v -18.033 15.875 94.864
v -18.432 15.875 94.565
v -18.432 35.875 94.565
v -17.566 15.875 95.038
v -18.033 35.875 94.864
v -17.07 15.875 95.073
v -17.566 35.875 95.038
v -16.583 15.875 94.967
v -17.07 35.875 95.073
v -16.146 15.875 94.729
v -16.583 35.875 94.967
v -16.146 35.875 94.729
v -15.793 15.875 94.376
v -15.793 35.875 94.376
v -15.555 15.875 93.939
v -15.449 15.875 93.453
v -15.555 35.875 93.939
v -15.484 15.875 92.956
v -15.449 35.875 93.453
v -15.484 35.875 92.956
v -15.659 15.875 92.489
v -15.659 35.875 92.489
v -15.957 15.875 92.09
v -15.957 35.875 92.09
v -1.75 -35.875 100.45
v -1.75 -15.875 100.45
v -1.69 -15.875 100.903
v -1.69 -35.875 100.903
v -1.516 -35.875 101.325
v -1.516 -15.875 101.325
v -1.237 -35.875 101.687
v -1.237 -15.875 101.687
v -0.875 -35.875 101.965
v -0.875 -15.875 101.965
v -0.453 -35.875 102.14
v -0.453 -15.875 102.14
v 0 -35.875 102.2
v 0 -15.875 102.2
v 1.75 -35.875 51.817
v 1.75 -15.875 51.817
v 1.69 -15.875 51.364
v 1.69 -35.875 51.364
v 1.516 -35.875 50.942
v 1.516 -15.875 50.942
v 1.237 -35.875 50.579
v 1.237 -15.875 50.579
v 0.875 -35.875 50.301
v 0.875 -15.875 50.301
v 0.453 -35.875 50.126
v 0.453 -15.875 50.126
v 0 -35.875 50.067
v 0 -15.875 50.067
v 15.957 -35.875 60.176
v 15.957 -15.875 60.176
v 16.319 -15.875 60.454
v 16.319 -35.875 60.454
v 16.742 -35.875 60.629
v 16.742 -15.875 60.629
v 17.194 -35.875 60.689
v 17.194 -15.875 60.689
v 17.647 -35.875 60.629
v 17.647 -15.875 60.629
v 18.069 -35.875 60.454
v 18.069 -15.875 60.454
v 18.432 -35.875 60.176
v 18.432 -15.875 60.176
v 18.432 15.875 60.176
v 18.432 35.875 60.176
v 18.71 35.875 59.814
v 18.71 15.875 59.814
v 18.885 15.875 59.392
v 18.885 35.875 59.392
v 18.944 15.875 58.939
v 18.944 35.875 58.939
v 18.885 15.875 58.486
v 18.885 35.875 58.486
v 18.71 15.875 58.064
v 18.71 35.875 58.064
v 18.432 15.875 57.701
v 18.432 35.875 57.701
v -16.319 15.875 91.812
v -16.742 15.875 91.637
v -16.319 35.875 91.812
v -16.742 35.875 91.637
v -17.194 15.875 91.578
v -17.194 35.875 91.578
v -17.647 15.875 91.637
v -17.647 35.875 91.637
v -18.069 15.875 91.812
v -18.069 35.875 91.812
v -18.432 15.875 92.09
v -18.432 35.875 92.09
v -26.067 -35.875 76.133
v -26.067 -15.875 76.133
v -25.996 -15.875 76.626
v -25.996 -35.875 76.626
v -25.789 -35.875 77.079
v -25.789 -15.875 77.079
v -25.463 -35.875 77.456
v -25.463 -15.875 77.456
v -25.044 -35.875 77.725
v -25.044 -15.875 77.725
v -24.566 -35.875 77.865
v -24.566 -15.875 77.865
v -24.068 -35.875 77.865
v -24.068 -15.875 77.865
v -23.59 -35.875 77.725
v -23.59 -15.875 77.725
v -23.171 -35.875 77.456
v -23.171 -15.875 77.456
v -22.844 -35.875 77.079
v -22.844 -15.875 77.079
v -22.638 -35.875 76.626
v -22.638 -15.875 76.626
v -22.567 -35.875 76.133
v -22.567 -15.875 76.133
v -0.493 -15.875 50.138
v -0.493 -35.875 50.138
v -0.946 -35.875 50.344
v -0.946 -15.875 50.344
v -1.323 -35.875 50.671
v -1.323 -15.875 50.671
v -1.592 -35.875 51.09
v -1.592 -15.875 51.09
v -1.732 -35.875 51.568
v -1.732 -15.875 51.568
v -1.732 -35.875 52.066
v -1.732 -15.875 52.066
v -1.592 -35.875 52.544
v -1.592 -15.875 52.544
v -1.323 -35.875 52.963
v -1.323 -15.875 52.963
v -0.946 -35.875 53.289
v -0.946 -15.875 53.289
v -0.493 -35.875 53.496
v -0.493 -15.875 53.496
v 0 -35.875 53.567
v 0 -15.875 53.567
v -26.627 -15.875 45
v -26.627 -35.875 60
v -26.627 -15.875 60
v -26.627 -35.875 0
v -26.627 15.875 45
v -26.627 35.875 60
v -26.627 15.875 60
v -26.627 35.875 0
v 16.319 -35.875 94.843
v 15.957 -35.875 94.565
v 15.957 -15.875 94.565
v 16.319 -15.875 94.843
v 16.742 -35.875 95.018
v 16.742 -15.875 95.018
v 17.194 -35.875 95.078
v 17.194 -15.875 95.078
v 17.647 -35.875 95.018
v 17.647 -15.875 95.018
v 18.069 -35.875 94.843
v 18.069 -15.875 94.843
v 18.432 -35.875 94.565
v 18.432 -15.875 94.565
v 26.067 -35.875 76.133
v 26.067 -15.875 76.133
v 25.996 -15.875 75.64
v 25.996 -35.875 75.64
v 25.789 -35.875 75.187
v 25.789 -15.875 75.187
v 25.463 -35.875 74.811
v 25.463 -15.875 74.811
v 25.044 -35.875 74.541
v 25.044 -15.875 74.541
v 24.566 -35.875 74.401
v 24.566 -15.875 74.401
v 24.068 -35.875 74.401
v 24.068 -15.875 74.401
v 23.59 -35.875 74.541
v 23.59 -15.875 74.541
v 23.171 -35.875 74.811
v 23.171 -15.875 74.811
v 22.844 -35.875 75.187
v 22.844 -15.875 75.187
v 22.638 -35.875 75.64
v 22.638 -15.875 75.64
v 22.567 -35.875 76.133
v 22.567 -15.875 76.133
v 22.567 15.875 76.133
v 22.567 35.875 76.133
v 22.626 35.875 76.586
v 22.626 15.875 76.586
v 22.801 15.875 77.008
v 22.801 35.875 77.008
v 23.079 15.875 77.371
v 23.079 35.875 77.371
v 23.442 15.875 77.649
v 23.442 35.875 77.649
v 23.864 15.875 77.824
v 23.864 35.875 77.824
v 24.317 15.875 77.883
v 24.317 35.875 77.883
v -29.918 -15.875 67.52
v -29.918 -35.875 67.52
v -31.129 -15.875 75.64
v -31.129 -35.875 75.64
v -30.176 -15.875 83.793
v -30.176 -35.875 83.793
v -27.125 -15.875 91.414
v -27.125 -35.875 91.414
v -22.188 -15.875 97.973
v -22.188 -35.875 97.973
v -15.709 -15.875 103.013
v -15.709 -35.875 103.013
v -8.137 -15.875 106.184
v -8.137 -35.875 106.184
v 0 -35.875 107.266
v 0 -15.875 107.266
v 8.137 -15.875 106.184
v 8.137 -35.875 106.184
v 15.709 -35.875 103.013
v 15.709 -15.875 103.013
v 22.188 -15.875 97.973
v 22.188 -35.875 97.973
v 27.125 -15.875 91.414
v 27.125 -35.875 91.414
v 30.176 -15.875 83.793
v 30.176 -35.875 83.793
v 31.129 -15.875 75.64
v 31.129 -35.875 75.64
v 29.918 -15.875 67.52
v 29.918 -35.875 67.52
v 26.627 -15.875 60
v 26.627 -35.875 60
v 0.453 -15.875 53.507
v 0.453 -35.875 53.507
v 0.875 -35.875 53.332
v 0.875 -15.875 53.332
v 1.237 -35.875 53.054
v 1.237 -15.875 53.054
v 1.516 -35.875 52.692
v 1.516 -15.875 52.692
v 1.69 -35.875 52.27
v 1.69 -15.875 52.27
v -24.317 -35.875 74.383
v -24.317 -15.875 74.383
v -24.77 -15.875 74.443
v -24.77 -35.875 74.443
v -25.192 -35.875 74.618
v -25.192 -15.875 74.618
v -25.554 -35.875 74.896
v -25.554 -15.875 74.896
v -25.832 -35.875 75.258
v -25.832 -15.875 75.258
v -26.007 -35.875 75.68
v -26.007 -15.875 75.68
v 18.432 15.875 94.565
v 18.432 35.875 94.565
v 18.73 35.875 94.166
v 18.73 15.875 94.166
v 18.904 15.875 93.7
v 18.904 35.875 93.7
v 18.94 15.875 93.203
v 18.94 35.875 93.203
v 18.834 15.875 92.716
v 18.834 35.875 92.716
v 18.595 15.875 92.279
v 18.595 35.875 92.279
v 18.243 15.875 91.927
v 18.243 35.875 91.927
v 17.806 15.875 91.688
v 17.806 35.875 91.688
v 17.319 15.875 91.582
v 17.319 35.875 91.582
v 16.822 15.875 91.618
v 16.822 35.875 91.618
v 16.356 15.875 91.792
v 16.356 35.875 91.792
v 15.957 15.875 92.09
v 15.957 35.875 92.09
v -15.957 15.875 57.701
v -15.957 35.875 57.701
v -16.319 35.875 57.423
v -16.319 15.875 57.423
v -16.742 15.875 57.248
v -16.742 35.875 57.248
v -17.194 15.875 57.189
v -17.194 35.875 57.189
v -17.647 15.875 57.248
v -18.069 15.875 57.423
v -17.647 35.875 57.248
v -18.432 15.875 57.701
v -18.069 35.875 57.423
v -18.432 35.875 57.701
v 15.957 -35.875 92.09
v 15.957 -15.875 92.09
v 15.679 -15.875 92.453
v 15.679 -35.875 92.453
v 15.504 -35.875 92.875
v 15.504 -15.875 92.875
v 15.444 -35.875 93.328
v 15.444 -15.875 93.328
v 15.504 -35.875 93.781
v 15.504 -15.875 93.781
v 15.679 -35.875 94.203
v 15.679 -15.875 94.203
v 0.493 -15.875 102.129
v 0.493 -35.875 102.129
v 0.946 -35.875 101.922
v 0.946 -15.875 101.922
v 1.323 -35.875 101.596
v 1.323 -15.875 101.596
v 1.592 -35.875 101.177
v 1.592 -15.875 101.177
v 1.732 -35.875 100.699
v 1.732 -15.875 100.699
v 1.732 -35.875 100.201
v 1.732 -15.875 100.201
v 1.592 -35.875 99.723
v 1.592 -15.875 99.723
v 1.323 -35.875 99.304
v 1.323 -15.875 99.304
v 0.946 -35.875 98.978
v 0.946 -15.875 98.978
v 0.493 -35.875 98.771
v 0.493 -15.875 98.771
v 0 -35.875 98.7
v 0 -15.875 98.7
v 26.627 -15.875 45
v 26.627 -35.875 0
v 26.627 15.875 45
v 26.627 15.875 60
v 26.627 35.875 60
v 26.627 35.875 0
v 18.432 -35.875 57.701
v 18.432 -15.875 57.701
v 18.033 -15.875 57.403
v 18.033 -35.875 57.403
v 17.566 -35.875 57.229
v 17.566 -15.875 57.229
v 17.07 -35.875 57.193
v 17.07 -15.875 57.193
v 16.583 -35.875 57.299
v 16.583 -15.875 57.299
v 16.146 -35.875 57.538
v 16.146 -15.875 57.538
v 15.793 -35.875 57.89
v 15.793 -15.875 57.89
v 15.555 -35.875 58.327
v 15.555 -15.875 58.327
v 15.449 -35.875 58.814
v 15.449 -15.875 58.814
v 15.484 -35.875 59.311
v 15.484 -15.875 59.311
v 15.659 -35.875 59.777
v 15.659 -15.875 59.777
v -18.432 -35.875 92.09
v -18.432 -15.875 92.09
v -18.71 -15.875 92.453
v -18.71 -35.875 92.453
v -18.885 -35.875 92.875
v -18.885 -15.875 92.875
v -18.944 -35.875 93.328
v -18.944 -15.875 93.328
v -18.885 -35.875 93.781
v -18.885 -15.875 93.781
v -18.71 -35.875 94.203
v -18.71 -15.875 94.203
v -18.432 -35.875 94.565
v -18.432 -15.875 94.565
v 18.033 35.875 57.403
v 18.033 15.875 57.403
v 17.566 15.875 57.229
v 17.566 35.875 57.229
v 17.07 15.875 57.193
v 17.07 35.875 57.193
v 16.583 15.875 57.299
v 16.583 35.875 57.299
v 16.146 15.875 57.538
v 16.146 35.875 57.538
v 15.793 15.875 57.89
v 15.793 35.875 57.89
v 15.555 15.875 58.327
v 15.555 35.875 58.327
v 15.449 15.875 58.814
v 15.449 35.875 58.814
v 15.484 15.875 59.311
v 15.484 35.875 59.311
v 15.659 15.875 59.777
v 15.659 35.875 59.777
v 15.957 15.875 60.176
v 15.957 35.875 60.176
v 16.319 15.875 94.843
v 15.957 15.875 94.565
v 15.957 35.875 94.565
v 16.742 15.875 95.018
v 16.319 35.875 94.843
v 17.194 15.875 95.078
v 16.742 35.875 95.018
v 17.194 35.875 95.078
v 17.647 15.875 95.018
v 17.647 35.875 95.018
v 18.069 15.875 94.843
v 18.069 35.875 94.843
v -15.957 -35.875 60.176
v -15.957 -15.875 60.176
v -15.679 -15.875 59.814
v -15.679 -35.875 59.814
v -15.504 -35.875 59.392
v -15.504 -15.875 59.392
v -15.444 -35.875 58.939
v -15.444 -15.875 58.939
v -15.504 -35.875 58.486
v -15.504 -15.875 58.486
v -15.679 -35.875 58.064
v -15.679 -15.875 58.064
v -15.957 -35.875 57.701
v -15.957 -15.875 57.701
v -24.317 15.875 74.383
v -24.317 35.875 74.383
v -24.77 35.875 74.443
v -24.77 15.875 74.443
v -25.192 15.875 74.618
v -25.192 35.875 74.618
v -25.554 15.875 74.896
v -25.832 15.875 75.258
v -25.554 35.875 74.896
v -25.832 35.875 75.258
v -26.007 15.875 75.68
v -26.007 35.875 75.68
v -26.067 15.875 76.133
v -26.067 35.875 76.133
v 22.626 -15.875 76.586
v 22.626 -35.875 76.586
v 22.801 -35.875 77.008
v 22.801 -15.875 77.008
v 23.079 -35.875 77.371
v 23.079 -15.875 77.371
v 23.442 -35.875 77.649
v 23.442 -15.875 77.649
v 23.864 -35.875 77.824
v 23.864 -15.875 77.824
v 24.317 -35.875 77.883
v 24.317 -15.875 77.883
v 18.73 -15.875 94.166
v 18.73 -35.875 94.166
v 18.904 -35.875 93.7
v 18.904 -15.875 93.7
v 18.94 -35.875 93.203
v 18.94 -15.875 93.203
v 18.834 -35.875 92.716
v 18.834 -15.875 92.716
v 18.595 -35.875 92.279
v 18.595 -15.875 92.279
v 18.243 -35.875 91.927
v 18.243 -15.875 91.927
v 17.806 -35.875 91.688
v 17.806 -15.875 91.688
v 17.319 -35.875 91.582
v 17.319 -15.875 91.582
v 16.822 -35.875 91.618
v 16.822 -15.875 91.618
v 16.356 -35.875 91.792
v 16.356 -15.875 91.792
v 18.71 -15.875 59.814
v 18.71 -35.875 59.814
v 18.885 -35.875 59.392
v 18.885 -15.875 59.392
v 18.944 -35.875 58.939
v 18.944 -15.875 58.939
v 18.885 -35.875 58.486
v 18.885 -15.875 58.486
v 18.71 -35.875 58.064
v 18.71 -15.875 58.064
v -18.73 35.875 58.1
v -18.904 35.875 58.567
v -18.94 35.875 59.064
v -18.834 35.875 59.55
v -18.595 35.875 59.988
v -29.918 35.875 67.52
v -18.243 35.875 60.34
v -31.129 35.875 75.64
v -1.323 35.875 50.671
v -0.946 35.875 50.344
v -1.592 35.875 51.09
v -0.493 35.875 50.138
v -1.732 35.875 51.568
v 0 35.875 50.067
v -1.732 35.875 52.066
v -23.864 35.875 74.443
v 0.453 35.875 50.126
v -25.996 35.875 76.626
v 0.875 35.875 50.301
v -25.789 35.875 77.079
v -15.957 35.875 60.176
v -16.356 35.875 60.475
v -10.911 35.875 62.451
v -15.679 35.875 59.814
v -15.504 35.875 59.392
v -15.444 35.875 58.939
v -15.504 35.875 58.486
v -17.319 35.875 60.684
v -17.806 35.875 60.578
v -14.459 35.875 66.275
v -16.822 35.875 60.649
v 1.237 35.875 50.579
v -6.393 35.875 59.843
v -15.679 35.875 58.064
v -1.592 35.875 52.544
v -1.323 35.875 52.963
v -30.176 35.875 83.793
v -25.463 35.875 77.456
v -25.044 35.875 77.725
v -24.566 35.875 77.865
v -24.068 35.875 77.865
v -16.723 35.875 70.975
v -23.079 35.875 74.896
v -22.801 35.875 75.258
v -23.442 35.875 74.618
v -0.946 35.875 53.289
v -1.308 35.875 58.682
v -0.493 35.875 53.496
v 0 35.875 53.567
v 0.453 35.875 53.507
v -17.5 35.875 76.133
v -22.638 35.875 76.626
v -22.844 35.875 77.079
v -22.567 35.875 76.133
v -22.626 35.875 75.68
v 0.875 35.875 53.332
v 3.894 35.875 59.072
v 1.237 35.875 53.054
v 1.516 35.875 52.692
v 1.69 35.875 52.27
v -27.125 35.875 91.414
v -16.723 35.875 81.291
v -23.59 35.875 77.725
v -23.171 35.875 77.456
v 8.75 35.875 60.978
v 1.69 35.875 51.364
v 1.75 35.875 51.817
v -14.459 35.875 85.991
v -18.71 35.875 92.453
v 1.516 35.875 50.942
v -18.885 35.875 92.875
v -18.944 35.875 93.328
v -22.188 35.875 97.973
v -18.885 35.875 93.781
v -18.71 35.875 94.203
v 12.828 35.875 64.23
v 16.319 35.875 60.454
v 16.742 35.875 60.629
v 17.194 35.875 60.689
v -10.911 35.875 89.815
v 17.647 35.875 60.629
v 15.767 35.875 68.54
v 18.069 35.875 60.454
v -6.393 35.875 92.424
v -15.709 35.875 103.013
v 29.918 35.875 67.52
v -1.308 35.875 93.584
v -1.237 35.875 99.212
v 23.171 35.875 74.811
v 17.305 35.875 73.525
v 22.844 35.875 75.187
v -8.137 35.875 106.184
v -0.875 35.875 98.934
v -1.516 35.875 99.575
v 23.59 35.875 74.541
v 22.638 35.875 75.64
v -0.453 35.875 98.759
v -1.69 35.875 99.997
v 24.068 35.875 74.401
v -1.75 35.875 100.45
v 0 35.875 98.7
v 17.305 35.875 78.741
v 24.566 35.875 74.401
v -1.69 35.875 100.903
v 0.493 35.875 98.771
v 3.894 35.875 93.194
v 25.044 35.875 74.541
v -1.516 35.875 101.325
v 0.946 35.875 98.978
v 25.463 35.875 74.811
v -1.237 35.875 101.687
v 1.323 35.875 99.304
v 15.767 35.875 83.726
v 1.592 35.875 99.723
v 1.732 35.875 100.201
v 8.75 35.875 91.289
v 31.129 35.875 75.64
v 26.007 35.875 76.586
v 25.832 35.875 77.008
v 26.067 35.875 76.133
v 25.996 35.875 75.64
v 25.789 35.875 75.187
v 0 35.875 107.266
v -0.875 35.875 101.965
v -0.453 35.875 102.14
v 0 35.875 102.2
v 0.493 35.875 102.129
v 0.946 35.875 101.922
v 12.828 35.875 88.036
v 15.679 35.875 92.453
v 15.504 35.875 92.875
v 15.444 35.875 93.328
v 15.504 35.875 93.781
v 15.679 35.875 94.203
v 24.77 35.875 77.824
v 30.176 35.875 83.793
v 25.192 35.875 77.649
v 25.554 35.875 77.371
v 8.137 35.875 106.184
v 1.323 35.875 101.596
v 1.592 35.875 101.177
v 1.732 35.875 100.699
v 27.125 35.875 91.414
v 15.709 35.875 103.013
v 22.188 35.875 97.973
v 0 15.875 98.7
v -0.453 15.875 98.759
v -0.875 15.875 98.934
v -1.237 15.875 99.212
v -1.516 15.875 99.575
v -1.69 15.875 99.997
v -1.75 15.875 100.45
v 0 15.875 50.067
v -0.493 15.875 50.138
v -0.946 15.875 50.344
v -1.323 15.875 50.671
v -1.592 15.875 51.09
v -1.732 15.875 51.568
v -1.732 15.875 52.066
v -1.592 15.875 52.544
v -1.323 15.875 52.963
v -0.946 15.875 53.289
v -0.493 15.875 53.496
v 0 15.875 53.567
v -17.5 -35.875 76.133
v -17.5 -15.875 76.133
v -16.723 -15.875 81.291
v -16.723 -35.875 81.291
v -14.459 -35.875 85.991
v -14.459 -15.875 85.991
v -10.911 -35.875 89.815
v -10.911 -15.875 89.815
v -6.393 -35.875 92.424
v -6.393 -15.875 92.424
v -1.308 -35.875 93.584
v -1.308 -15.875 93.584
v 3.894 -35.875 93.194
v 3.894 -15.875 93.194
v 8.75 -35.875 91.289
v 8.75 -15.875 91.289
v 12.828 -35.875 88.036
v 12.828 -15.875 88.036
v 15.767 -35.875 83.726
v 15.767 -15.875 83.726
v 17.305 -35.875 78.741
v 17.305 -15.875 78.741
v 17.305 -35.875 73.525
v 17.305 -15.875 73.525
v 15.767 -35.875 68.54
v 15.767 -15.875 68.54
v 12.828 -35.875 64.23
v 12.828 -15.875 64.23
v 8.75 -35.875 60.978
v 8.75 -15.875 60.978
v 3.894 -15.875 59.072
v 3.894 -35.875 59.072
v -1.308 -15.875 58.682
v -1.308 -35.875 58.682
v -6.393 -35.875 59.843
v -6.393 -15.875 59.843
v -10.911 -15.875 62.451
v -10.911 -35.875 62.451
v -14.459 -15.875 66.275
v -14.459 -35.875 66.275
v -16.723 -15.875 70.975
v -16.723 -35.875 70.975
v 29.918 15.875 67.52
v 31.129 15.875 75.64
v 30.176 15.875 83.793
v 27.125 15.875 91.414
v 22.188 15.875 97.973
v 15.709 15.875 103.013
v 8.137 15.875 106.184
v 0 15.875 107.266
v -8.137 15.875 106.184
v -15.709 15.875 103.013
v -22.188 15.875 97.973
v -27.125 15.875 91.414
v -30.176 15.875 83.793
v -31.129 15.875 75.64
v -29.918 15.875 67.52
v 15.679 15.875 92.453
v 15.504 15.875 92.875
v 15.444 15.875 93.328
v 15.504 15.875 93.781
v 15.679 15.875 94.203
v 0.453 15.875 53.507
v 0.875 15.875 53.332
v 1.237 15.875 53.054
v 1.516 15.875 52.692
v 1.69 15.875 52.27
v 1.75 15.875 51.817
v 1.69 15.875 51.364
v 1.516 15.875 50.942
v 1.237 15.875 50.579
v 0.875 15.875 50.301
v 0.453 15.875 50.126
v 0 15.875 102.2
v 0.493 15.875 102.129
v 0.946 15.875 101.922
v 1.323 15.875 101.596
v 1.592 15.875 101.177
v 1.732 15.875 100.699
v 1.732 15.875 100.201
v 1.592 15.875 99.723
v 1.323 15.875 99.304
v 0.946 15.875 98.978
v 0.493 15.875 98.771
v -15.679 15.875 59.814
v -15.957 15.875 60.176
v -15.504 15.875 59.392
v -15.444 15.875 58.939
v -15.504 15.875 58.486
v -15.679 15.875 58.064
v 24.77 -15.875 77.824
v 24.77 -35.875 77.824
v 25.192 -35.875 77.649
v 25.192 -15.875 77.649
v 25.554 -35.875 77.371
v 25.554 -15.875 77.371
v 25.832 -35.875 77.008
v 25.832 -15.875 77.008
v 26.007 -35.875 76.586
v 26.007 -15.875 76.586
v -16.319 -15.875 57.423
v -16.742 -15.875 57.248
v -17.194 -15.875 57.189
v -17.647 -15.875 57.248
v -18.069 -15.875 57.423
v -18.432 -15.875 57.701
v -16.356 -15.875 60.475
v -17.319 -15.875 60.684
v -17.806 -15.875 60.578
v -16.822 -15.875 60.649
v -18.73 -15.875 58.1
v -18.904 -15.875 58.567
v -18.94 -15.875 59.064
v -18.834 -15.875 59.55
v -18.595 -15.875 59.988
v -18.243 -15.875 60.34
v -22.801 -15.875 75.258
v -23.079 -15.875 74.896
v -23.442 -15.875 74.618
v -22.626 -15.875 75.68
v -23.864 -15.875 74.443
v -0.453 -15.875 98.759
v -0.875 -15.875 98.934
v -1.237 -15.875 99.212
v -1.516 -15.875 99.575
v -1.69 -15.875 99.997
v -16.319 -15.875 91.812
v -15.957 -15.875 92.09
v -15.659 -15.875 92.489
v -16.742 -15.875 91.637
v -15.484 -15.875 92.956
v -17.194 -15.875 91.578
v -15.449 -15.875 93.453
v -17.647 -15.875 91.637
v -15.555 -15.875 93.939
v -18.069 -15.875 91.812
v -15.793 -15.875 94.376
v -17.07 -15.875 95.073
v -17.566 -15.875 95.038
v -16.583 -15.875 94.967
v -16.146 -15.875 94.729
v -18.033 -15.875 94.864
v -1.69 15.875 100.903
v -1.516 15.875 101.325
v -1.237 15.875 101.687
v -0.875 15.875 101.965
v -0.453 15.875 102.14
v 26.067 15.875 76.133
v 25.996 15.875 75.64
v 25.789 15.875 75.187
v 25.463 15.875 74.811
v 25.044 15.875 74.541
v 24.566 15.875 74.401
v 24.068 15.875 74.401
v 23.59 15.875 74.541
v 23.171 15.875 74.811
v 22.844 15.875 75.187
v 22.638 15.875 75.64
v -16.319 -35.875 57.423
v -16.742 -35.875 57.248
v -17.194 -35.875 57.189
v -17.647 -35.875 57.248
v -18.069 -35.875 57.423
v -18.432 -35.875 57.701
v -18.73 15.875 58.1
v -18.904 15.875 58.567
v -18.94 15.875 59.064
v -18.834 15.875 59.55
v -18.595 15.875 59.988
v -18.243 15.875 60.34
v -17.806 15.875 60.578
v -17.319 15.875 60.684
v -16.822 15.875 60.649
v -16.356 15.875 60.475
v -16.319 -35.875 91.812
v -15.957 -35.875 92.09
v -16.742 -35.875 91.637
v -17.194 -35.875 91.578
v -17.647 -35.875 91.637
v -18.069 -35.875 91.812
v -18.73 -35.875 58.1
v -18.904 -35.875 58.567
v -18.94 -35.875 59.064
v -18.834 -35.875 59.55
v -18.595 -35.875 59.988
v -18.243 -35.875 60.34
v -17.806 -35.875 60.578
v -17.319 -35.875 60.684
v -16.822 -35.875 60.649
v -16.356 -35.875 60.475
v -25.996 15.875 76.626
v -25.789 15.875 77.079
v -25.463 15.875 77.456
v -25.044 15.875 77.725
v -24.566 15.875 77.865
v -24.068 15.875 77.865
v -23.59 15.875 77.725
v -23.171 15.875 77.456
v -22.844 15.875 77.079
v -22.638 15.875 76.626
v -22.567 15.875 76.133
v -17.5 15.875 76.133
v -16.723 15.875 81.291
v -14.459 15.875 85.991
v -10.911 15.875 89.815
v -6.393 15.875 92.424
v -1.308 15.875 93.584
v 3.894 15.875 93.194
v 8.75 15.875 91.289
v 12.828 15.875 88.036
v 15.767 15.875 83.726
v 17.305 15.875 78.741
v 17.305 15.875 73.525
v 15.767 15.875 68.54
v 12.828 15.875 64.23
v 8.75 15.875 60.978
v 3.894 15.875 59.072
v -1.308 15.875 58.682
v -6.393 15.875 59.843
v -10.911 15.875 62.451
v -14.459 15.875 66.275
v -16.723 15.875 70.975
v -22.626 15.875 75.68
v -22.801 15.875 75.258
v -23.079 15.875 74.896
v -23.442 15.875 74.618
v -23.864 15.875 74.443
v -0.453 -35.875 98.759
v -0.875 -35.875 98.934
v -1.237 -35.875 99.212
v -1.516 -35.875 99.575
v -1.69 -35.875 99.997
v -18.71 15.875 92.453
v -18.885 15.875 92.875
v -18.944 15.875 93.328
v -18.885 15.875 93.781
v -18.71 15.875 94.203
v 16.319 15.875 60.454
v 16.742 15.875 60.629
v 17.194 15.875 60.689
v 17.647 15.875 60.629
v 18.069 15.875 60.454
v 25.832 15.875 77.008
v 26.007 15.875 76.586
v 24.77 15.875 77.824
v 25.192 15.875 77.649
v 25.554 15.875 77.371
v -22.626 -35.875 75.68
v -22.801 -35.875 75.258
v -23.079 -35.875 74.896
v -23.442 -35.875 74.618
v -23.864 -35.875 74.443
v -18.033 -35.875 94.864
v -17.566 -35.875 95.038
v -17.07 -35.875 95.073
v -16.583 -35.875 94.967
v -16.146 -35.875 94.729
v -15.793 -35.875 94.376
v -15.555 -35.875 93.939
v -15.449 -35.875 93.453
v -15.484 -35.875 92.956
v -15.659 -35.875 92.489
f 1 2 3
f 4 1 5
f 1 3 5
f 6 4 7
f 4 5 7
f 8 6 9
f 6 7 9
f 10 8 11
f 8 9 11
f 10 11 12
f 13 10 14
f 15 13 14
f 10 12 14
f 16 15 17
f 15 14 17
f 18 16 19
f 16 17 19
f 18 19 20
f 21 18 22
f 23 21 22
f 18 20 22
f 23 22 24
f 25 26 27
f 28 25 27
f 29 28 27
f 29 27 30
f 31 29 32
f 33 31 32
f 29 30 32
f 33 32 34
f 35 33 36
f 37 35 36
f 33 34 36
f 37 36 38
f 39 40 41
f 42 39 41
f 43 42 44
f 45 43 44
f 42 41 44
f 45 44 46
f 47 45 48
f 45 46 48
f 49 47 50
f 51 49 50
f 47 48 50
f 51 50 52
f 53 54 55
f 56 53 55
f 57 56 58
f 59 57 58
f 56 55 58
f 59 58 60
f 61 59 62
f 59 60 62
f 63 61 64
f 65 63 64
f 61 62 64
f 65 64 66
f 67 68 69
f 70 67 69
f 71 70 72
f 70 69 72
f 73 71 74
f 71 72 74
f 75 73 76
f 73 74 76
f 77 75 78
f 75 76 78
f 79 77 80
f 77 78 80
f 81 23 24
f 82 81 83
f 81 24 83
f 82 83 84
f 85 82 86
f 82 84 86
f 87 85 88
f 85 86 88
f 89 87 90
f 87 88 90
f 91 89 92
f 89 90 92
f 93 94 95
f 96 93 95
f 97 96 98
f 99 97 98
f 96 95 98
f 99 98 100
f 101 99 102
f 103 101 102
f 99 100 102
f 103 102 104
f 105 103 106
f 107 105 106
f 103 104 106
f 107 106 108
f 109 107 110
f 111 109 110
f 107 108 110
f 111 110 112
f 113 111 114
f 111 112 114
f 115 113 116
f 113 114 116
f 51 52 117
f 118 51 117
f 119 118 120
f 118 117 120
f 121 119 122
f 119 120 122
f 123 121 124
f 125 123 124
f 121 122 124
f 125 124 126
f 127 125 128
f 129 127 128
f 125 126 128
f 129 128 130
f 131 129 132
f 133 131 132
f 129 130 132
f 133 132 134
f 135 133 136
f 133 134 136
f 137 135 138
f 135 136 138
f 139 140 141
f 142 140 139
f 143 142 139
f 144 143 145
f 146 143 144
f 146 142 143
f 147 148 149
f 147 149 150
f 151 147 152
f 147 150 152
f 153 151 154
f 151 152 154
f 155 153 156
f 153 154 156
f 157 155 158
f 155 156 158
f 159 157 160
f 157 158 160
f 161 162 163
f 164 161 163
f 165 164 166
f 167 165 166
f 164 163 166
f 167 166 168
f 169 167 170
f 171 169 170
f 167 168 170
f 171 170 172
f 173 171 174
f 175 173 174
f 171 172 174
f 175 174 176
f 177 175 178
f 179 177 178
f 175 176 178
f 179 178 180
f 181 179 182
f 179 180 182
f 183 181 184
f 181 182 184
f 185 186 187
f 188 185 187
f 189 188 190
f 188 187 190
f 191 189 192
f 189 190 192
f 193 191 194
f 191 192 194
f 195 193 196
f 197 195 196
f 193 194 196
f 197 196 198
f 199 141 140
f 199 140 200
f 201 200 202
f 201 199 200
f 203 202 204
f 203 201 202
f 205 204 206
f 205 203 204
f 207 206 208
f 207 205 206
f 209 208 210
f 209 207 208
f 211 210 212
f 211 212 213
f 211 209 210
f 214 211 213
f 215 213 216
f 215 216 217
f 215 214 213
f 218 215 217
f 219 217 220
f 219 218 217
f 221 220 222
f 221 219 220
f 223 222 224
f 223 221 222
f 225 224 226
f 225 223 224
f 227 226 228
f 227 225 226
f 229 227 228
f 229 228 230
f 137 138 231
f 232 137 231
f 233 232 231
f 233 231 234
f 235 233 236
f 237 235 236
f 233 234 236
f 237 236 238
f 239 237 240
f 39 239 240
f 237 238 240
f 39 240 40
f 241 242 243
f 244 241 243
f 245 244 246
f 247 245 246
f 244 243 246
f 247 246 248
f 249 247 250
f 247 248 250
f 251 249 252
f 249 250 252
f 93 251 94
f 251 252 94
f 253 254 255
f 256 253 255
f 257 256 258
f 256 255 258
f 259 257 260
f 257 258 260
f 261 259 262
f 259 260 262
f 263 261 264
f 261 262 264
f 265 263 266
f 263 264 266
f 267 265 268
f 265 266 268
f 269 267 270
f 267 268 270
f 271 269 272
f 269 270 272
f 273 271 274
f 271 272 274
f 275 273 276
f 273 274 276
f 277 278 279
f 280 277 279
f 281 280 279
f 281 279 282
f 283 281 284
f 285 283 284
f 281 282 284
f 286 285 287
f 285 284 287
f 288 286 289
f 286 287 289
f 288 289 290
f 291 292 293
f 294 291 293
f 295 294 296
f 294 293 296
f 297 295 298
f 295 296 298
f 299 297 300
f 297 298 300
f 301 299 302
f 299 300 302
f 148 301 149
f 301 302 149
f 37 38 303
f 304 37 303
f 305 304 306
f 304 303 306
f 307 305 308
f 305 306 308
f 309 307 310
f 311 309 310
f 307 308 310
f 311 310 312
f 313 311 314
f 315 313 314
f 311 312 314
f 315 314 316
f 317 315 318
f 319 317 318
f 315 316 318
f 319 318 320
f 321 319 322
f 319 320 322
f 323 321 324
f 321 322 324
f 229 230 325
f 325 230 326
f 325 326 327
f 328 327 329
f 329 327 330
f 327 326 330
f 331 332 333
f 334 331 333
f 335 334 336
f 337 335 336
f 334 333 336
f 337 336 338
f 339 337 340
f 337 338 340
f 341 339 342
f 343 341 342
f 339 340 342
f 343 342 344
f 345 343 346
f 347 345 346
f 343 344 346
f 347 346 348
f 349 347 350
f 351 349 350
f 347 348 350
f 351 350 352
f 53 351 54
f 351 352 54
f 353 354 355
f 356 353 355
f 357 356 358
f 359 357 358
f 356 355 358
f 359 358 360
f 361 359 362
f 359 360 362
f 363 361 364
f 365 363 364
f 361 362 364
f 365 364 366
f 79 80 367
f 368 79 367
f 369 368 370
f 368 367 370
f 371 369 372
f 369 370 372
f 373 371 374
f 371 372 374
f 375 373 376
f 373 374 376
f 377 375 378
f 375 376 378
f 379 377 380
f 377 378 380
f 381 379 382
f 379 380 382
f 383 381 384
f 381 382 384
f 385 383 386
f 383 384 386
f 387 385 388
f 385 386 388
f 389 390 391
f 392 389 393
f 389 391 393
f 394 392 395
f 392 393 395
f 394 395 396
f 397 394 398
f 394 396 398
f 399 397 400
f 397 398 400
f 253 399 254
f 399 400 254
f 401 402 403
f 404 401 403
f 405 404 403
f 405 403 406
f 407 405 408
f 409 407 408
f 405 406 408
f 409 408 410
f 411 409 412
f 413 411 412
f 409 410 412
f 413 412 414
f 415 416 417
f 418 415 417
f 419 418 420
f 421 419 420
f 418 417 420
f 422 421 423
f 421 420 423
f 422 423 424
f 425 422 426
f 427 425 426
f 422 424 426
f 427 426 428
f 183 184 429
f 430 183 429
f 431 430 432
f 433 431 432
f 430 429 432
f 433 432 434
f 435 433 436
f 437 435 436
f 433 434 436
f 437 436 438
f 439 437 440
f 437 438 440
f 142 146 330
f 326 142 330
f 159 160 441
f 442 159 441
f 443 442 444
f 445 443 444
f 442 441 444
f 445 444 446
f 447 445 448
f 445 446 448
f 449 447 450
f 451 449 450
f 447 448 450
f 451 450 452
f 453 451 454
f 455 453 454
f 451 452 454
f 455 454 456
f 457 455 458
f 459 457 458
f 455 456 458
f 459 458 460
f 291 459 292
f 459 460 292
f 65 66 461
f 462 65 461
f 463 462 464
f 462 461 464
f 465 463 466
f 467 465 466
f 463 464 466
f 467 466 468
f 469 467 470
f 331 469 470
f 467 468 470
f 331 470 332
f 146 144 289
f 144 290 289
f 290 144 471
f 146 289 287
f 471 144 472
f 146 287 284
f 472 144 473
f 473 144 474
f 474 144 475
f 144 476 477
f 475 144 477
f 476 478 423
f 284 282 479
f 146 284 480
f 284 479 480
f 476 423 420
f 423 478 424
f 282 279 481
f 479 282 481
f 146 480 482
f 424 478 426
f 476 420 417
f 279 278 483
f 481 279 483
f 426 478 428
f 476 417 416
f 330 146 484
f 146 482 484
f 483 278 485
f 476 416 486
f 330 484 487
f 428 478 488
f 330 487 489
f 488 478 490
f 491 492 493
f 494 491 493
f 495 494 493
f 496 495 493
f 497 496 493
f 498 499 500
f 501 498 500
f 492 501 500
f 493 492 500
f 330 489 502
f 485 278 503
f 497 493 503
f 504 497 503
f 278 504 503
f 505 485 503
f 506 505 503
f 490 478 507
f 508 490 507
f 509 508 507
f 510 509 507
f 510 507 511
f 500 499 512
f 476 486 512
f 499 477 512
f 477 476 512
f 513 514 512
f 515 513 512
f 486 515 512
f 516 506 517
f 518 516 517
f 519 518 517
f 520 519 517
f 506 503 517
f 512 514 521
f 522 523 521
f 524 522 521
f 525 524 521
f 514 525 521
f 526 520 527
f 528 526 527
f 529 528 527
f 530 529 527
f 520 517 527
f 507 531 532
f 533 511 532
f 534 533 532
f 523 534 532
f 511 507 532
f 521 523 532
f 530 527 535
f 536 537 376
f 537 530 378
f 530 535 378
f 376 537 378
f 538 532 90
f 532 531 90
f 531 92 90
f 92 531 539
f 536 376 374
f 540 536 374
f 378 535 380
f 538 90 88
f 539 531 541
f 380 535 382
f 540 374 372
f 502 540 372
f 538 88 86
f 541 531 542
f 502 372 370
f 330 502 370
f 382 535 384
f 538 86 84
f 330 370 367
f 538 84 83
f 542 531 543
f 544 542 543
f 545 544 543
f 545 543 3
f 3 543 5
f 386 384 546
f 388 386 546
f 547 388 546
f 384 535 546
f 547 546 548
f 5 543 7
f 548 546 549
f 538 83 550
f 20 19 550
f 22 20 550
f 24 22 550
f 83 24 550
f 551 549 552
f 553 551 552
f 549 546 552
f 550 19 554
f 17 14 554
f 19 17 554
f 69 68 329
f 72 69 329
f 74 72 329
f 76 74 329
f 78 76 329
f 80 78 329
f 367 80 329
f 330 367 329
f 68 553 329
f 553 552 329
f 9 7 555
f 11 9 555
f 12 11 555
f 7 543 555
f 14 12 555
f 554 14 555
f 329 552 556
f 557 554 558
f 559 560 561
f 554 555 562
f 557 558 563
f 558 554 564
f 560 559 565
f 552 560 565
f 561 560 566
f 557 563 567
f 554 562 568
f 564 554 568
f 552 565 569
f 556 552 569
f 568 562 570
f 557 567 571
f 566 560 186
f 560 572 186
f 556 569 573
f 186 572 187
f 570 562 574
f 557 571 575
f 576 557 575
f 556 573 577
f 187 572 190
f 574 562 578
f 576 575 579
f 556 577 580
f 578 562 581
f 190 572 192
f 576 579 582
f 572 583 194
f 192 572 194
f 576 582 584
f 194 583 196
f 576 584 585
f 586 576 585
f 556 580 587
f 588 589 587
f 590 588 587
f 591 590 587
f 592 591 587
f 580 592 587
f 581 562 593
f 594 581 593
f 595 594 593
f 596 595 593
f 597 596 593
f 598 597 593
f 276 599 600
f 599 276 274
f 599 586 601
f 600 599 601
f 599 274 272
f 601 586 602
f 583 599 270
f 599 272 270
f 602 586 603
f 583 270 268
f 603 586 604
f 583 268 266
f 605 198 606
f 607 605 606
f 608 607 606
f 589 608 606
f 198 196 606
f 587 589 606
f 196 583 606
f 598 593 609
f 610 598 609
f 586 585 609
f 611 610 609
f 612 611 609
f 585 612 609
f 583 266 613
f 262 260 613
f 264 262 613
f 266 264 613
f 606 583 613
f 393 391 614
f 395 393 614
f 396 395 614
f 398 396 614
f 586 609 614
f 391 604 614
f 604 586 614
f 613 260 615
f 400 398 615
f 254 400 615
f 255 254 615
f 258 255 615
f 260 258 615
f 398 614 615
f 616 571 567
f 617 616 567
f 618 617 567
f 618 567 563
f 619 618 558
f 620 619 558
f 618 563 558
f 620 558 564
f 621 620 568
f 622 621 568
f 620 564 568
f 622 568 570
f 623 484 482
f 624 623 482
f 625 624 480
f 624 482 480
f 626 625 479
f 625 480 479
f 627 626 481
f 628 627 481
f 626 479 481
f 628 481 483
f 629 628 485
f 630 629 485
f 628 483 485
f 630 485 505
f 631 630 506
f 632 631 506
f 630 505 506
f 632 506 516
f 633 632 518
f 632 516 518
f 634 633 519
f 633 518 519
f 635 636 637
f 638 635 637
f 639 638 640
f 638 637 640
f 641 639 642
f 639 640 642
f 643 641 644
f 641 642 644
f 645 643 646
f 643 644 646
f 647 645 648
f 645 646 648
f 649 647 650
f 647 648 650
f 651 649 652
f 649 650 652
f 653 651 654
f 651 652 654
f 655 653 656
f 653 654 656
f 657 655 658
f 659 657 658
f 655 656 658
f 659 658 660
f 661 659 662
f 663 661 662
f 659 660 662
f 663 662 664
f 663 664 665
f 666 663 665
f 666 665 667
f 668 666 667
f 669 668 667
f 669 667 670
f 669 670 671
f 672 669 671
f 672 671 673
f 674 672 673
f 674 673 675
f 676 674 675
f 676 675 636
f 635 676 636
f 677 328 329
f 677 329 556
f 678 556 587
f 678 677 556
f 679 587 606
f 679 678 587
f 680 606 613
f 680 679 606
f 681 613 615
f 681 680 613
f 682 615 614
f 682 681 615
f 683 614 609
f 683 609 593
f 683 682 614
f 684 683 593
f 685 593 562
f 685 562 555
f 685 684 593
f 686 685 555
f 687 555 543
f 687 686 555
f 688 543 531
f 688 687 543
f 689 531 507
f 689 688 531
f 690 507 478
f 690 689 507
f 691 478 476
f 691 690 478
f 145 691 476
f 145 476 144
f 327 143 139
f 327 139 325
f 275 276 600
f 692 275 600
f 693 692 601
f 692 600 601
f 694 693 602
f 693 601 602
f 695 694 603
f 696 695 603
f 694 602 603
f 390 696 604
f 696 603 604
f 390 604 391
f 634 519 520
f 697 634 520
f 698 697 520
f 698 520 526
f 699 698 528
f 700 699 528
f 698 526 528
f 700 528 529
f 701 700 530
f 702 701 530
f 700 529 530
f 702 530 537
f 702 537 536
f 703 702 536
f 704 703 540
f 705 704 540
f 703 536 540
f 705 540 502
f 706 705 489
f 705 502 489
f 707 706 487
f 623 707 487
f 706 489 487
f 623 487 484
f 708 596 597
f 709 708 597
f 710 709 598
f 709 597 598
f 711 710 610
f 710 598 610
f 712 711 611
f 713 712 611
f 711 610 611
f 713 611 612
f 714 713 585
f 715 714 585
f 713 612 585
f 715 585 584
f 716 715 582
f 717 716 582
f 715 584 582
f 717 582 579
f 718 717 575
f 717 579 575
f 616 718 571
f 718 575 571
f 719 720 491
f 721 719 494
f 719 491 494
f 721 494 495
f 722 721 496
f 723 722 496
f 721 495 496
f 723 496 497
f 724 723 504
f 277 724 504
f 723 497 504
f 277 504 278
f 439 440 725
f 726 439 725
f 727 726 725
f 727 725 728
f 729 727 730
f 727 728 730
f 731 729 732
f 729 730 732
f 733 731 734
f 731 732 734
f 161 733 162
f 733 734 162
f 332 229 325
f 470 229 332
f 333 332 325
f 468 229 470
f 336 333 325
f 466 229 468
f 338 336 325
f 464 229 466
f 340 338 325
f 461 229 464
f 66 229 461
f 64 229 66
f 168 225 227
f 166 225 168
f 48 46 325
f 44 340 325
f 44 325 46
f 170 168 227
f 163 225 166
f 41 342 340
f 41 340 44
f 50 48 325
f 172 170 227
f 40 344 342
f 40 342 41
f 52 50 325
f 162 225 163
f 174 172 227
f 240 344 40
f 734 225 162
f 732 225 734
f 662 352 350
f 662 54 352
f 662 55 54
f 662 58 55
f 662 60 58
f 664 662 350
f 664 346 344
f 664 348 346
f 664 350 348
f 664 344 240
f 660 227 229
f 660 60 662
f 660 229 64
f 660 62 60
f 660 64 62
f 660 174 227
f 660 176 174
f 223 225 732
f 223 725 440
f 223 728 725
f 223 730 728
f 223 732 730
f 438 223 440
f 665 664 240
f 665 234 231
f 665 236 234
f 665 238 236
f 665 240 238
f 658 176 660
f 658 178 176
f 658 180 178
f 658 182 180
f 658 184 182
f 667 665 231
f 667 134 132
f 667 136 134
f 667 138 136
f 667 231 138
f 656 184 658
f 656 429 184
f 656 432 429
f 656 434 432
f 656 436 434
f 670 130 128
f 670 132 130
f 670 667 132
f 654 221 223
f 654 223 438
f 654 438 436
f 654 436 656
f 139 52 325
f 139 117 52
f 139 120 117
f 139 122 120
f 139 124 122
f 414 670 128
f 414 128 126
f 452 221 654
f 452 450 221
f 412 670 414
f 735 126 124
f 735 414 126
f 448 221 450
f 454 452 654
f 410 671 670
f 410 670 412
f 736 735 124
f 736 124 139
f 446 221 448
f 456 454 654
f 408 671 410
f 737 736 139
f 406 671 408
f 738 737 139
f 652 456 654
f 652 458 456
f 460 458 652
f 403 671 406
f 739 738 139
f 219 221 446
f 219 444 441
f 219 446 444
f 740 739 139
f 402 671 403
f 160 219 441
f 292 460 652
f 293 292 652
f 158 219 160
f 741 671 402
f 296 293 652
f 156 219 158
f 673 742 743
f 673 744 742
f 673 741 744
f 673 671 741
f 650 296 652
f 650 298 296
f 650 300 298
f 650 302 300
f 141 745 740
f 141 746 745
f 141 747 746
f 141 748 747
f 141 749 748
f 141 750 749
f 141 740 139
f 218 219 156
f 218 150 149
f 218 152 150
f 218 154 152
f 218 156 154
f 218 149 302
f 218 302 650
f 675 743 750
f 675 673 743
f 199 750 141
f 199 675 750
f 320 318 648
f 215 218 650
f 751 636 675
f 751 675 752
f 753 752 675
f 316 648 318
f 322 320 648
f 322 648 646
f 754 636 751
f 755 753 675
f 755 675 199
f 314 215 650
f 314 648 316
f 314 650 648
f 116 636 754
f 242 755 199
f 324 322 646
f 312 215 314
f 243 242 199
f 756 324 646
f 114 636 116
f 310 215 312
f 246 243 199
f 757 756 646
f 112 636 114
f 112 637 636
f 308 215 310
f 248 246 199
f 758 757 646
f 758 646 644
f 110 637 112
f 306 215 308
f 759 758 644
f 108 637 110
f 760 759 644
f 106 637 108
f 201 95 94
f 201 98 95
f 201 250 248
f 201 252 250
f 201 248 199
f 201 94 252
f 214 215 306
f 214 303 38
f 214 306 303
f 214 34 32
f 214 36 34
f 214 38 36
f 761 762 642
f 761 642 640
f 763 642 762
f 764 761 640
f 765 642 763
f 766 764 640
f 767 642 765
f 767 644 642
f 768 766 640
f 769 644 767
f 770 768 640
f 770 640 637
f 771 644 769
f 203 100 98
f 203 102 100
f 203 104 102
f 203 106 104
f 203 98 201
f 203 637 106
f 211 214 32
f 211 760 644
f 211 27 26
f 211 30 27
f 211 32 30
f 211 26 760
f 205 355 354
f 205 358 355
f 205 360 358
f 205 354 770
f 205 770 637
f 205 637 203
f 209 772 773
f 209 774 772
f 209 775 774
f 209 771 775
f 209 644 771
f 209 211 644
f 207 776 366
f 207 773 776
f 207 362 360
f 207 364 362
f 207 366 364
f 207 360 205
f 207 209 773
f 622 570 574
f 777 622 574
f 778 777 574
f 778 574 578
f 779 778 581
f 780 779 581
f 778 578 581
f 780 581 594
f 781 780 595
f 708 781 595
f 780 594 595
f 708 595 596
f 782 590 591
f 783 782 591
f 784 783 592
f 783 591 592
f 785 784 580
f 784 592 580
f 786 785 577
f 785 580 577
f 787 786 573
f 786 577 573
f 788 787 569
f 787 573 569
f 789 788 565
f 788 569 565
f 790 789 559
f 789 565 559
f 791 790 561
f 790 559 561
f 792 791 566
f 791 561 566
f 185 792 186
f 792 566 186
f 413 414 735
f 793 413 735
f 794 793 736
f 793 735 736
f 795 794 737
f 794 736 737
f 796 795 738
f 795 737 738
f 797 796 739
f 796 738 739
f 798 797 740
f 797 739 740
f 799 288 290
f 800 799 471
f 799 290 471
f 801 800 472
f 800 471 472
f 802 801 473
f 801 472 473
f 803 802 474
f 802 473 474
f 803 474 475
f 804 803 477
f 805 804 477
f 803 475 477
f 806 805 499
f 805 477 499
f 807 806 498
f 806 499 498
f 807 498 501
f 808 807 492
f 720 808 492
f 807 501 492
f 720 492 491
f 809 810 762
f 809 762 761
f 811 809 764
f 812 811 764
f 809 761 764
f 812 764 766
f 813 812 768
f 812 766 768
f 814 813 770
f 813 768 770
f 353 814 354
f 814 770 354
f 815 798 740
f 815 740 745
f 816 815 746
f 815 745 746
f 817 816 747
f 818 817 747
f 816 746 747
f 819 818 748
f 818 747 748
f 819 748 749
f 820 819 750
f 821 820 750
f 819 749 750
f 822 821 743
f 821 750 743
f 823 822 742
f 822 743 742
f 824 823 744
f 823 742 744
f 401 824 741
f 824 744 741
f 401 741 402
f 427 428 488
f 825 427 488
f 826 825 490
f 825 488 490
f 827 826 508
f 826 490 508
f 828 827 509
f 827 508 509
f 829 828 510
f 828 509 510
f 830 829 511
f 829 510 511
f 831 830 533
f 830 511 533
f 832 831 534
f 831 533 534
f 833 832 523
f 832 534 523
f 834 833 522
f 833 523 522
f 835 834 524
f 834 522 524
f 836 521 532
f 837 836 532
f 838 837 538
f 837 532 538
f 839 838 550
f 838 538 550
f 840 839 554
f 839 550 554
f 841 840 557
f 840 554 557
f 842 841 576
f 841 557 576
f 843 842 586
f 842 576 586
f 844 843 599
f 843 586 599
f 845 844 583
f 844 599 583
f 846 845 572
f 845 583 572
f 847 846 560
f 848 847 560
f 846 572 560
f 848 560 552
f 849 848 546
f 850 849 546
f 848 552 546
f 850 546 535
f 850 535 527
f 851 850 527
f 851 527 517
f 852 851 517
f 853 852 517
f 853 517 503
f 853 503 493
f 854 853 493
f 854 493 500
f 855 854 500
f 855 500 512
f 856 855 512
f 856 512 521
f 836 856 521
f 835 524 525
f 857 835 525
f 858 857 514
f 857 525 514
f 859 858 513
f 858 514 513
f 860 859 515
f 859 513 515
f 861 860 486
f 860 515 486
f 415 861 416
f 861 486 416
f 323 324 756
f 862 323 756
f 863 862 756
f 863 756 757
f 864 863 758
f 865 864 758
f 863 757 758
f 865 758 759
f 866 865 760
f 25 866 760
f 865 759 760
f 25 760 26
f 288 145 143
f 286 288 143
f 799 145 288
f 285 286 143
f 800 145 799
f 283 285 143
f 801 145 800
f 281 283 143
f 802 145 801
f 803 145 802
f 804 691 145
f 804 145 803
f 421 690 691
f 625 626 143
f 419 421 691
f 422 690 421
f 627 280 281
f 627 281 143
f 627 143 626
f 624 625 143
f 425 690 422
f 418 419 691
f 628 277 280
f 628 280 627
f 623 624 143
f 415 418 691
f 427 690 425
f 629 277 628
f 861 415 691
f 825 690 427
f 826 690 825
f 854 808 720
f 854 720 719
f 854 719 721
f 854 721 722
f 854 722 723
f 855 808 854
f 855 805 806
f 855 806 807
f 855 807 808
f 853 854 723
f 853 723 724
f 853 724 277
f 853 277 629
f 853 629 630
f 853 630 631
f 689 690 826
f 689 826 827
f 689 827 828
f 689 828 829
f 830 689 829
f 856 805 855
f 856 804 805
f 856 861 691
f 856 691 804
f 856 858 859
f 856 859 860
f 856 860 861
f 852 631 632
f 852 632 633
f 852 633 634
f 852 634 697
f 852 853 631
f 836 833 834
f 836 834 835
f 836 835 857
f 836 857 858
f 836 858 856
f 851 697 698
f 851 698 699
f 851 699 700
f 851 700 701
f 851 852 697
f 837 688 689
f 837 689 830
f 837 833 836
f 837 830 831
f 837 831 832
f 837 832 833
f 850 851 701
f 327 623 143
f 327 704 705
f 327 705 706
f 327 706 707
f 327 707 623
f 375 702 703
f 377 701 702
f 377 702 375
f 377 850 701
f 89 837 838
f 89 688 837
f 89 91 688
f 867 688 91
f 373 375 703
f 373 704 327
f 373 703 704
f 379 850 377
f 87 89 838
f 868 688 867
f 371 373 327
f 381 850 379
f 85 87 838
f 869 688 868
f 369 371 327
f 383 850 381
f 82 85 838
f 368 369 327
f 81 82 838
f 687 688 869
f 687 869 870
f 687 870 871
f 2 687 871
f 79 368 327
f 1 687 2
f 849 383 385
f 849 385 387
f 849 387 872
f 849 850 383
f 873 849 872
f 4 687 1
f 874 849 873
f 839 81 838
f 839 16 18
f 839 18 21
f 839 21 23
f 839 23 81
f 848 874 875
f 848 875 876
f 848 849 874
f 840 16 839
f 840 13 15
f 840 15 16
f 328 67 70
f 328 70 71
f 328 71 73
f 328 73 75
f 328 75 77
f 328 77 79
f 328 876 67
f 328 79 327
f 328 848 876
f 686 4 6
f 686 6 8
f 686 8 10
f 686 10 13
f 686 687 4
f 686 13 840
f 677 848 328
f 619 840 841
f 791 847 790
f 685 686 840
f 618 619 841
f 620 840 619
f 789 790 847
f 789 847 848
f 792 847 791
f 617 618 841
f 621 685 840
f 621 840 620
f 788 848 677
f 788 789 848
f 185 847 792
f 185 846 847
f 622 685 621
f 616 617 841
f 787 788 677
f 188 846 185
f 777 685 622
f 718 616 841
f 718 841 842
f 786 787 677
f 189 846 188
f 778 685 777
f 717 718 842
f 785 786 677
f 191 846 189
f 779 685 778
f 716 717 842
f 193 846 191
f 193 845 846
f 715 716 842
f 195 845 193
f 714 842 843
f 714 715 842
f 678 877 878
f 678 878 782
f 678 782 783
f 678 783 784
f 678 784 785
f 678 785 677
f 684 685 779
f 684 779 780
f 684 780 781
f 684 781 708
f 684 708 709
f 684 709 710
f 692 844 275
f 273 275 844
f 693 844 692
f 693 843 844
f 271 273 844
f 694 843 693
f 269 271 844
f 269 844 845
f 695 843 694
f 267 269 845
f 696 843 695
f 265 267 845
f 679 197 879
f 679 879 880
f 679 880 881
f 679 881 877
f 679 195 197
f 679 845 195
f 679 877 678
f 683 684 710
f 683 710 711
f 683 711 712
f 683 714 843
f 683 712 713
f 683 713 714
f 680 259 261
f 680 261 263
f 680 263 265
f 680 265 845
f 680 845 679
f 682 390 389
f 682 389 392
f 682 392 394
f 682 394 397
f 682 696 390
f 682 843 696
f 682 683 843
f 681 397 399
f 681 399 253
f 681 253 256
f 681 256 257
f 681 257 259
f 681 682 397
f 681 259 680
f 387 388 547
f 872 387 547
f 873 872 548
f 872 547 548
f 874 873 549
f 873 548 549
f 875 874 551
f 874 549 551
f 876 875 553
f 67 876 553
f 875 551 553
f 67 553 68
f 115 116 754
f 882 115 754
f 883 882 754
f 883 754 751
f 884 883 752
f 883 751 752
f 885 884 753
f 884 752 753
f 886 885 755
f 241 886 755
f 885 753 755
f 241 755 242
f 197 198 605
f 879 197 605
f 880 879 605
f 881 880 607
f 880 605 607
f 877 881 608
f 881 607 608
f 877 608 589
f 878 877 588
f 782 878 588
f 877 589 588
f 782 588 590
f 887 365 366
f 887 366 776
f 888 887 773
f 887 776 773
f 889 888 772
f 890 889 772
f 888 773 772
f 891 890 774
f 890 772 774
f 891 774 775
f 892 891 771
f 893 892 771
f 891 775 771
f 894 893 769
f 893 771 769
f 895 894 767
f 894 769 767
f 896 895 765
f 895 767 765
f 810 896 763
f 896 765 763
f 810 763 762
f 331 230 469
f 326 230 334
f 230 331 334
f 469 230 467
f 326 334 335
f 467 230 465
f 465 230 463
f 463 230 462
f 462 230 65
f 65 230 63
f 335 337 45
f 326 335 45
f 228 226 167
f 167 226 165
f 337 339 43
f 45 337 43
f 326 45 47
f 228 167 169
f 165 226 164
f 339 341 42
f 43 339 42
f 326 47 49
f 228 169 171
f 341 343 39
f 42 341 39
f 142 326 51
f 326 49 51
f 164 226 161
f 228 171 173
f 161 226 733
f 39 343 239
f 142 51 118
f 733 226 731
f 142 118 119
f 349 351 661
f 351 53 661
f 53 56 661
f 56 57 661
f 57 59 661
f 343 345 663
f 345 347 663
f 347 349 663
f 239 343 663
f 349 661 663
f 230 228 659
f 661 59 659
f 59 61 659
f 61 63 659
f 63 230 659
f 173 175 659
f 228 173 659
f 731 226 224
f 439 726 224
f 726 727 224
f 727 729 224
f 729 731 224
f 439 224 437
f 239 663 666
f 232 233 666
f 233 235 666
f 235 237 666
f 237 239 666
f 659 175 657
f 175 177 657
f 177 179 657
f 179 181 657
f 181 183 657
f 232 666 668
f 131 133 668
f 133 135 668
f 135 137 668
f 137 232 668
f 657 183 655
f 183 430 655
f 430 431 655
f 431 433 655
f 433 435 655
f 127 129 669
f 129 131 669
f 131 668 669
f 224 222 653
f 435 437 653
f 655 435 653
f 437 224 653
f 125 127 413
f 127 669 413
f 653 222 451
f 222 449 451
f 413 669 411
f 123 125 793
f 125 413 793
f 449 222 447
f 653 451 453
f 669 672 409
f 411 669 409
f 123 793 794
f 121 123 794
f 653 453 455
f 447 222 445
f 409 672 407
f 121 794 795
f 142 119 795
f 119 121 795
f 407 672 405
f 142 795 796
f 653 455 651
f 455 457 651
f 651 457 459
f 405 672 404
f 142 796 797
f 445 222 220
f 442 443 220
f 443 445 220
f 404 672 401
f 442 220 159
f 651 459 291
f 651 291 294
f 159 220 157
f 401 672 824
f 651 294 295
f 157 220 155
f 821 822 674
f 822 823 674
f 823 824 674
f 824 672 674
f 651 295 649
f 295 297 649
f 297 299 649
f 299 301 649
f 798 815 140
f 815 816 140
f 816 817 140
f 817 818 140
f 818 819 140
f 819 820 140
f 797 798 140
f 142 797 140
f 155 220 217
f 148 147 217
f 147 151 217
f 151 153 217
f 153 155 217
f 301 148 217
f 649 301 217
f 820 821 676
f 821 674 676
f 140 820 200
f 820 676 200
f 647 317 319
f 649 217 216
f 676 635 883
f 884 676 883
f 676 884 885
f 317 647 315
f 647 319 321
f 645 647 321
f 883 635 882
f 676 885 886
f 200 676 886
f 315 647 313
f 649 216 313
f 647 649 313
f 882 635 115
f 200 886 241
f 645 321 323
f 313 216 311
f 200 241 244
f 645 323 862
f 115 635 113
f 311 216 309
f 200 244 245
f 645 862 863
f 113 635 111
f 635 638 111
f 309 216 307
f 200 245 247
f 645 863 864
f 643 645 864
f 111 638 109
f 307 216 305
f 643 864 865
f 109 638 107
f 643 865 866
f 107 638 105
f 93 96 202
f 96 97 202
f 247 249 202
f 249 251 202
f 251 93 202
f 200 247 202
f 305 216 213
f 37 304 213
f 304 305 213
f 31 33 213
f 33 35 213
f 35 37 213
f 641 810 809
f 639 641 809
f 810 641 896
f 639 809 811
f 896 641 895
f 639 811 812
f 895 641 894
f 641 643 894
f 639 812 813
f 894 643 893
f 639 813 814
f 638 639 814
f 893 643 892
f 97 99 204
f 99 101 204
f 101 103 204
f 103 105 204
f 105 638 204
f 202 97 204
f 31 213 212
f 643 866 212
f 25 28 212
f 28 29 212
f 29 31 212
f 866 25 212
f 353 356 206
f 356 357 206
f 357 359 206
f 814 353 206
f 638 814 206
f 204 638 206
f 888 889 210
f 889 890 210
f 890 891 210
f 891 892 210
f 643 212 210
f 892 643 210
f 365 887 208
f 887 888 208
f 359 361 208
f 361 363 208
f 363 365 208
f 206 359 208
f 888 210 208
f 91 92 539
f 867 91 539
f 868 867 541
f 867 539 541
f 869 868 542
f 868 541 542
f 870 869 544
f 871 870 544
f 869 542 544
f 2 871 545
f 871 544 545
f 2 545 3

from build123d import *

# Parameters (mm, degrees)
F0_W             = 53.254
F0_H             = 20
F0_H_2           = 31.75
F1_DEPTH         = 45
F2_W             = 53.254
F2_H             = 20
F3_DEPTH         = 15
F4_R             = 31.1332376333
F5_DEPTH         = 20
F6_R             = 31.1332376333
F7_DEPTH         = 20
F8_R             = 17.5
F9_DEPTH         = 100
F11_DEPTH        = 100
F11_COPIES_COUNT = 8


# Not quite as in the source:
# - a pattern or mirror of a feature is missing from the dataset's text; its kind, count and spacing are read off the source's solid


with BuildPart() as f1:
    # F0 (on Top) → F1 (new body)
    with BuildSketch(Plane.XY):
        with Locations((0, 25.875)):
            Rectangle(F0_W, F0_H)
        Rectangle(F0_W, F0_H_2)
        with Locations((0, -25.875)):
            Rectangle(F0_W, F0_H)
    extrude(amount=F1_DEPTH)

    # F2 (on face) → F3 (join)
    with BuildSketch(Plane.XY.offset(45)):
        with Locations((0, 25.875)):
            Rectangle(F2_W, F2_H)
        with Locations((0, -25.875)):
            Rectangle(F2_W, F2_H)
    extrude(amount=F3_DEPTH)

    # F4 (on face) → F5 (join)
    with BuildSketch(Plane.XZ.offset(-15.875)):
        with Locations((0, 76.1332376333)):
            Circle(F4_R)
    extrude(amount=-F5_DEPTH)

    # F6 (on face) → F7 (join)
    with BuildSketch(Plane(origin=(0, -15.875, 0), x_dir=(-1, 0, 0), z_dir=(0, 1, 0))):
        with Locations((0, 76.1332376333)):
            Circle(F6_R)
    extrude(amount=-F7_DEPTH)

    # F8 (on face) → F9 (cut)
    with BuildSketch(Plane(origin=(0, 35.875, 0), x_dir=(-1, 0, 0), z_dir=(0, 1, 0))):
        with Locations((0, 76.1332376333)):
            Circle(F8_R)
    extrude(amount=-F9_DEPTH, mode=Mode.SUBTRACT)

    # F10 (on face) → F11 (cut)
    with BuildSketch(Plane(origin=(0, 35.875, 0), x_dir=(-1, 0, 0), z_dir=(0, 1, 0))):
        with BuildLine():
            ThreePointArc((0, 102.19985645), (-1.75, 100.44985645), (0, 98.69985645))
            Line((0, 98.69985645), (0, 102.19985645))
        make_face()
        with BuildLine():
            Line((0, 102.19985645), (0, 98.69985645))
            ThreePointArc((0, 98.69985645), (1.2374368671, 99.2124195829), (1.75, 100.44985645))
            ThreePointArc((1.75, 100.44985645), (1.2374368671, 101.6872933171), (0, 102.19985645))
        make_face()
    f11 = extrude(amount=-F11_DEPTH, mode=Mode.SUBTRACT)

    # F11_copies: F11 ×8 about axis
    f11_copies_axis = Axis((0, 0, 76.133238), (0, 1, 0))
    for i in range(1, F11_COPIES_COUNT):
        add(f11.rotate(f11_copies_axis, i * 360 / F11_COPIES_COUNT), mode=Mode.SUBTRACT)


solid = f1.part
